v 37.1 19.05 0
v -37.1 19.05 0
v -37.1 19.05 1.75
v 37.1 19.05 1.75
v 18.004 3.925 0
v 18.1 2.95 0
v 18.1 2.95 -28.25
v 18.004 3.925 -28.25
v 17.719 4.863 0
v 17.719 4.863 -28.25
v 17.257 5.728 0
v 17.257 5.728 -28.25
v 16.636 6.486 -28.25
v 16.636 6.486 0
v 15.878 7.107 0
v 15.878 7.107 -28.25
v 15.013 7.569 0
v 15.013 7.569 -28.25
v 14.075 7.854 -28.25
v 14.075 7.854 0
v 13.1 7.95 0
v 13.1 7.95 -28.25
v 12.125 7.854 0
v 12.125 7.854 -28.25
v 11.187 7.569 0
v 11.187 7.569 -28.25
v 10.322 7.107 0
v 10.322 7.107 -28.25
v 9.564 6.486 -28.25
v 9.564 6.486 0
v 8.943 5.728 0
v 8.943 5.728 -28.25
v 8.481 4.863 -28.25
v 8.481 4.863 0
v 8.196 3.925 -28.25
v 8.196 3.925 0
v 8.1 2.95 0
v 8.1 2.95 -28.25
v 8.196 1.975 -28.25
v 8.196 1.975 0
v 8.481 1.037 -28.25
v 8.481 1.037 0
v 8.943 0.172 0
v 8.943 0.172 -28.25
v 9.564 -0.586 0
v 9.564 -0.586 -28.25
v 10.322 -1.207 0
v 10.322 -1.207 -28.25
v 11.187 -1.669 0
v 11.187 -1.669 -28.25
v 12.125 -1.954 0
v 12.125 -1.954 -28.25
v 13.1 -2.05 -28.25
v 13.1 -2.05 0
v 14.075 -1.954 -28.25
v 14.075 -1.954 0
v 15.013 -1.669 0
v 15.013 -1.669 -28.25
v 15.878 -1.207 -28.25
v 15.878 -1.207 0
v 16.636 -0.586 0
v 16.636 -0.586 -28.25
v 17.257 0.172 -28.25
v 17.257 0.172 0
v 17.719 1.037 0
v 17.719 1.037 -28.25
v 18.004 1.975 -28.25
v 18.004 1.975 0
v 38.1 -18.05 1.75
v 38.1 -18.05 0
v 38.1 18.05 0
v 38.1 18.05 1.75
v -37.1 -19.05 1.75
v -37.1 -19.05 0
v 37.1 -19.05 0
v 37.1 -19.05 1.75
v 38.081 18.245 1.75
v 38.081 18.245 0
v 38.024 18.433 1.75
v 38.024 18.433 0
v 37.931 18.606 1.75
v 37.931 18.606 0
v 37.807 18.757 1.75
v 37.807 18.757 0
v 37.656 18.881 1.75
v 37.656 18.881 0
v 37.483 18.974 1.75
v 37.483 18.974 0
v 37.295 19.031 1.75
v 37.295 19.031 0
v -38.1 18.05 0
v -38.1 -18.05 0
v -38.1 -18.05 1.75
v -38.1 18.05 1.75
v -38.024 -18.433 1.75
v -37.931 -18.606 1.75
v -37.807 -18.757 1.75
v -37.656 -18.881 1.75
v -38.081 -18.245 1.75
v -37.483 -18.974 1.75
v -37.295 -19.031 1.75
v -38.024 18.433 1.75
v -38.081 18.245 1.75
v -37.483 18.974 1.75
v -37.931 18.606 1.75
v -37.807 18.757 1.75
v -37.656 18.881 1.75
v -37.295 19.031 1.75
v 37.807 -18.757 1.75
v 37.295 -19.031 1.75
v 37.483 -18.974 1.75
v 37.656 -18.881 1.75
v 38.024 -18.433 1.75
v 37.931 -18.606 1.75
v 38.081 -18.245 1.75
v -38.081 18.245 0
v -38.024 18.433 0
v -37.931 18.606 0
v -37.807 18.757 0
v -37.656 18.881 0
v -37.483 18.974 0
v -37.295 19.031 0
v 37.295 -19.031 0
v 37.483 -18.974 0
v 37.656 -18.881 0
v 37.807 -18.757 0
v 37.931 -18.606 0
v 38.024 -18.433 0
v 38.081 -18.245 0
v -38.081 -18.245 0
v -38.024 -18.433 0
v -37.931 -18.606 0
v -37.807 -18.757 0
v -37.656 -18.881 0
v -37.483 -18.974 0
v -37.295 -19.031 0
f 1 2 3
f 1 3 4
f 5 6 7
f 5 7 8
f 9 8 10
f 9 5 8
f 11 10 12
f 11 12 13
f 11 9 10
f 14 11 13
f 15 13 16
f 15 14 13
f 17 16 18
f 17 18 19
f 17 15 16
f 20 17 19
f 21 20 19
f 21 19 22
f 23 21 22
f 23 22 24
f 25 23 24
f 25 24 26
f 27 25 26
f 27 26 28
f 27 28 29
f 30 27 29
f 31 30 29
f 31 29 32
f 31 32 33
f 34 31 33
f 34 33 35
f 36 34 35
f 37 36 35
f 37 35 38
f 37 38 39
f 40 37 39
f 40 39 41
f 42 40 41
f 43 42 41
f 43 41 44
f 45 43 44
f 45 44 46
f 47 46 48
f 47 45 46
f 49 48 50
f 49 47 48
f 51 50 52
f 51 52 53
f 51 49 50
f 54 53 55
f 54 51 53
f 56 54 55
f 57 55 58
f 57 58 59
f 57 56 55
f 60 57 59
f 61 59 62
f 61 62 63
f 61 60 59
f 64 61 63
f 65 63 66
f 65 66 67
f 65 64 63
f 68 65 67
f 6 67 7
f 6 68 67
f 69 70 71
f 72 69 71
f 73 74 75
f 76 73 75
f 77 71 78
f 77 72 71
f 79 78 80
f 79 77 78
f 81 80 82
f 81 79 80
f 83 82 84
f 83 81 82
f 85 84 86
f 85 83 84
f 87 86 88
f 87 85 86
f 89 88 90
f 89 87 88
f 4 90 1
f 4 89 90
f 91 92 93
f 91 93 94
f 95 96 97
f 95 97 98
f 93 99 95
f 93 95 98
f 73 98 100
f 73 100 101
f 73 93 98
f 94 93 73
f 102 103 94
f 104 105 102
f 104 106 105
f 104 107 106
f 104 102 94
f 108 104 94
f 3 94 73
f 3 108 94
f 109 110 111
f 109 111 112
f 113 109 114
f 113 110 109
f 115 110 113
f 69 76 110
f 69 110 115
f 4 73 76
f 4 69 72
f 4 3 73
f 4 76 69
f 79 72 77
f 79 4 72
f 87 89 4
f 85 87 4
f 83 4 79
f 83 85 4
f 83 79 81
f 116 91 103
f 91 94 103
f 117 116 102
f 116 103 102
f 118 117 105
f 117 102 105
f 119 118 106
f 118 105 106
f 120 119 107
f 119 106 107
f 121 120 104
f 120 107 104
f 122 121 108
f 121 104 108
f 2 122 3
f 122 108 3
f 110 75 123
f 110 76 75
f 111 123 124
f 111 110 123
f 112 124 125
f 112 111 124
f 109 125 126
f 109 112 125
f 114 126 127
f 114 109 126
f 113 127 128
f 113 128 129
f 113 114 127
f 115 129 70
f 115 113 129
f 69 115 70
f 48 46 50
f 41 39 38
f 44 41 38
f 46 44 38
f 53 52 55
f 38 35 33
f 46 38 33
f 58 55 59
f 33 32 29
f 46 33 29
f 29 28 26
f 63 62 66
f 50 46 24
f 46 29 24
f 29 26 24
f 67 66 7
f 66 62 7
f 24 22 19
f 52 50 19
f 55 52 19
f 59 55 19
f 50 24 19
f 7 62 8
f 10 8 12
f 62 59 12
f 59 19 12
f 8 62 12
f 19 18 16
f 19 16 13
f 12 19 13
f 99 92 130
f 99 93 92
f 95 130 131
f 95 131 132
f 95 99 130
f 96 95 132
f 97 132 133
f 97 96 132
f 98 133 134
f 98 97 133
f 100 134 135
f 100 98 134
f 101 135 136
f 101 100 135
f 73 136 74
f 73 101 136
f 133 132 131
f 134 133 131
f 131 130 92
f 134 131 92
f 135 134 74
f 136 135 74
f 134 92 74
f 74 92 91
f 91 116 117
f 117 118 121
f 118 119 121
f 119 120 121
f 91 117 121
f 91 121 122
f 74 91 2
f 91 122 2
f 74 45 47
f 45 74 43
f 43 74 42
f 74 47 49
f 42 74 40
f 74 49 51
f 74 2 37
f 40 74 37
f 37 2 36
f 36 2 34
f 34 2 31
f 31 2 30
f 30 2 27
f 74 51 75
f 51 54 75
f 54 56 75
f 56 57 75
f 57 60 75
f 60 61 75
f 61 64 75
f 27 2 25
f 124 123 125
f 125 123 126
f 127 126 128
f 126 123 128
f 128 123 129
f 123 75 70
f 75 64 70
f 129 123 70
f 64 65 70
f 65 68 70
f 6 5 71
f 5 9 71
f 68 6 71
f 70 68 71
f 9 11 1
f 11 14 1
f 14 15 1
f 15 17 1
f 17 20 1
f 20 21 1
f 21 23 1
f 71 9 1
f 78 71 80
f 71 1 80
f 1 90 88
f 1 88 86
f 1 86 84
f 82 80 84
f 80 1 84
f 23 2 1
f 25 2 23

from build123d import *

# Parameters (mm, degrees)
SKETCH1_W           = 76.2
SKETCH1_H           = 38.1
BOSS_EXTRUDE1_DEPTH = 1.75
FILLET1_R           = 1
SKETCH2_R           = 5
BOSS_EXTRUDE2_DEPTH = 30


with BuildPart() as part:
    # Sketch1 → Boss-Extrude1 (new body)
    with BuildSketch(Plane.XY):
        Rectangle(SKETCH1_W, SKETCH1_H)
    extrude(amount=BOSS_EXTRUDE1_DEPTH)

    # Fillet1
    fillet1_edges = [part.edges().sort_by_distance(p)[0] for p in [
        (38.1, -19.05, 0.875),
        (-38.1, -19.05, 0.875),
        (-38.1, 19.05, 0.875),
        (38.1, 19.05, 0.875),
    ]]
    fillet(fillet1_edges, radius=FILLET1_R)

    # Sketch2 → Boss-Extrude2 (add)
    with BuildSketch(Plane.XY.offset(1.75)):
        with Locations((13.1, 2.95)):
            Circle(SKETCH2_R)
    extrude(amount=-BOSS_EXTRUDE2_DEPTH)


solid = part.part
